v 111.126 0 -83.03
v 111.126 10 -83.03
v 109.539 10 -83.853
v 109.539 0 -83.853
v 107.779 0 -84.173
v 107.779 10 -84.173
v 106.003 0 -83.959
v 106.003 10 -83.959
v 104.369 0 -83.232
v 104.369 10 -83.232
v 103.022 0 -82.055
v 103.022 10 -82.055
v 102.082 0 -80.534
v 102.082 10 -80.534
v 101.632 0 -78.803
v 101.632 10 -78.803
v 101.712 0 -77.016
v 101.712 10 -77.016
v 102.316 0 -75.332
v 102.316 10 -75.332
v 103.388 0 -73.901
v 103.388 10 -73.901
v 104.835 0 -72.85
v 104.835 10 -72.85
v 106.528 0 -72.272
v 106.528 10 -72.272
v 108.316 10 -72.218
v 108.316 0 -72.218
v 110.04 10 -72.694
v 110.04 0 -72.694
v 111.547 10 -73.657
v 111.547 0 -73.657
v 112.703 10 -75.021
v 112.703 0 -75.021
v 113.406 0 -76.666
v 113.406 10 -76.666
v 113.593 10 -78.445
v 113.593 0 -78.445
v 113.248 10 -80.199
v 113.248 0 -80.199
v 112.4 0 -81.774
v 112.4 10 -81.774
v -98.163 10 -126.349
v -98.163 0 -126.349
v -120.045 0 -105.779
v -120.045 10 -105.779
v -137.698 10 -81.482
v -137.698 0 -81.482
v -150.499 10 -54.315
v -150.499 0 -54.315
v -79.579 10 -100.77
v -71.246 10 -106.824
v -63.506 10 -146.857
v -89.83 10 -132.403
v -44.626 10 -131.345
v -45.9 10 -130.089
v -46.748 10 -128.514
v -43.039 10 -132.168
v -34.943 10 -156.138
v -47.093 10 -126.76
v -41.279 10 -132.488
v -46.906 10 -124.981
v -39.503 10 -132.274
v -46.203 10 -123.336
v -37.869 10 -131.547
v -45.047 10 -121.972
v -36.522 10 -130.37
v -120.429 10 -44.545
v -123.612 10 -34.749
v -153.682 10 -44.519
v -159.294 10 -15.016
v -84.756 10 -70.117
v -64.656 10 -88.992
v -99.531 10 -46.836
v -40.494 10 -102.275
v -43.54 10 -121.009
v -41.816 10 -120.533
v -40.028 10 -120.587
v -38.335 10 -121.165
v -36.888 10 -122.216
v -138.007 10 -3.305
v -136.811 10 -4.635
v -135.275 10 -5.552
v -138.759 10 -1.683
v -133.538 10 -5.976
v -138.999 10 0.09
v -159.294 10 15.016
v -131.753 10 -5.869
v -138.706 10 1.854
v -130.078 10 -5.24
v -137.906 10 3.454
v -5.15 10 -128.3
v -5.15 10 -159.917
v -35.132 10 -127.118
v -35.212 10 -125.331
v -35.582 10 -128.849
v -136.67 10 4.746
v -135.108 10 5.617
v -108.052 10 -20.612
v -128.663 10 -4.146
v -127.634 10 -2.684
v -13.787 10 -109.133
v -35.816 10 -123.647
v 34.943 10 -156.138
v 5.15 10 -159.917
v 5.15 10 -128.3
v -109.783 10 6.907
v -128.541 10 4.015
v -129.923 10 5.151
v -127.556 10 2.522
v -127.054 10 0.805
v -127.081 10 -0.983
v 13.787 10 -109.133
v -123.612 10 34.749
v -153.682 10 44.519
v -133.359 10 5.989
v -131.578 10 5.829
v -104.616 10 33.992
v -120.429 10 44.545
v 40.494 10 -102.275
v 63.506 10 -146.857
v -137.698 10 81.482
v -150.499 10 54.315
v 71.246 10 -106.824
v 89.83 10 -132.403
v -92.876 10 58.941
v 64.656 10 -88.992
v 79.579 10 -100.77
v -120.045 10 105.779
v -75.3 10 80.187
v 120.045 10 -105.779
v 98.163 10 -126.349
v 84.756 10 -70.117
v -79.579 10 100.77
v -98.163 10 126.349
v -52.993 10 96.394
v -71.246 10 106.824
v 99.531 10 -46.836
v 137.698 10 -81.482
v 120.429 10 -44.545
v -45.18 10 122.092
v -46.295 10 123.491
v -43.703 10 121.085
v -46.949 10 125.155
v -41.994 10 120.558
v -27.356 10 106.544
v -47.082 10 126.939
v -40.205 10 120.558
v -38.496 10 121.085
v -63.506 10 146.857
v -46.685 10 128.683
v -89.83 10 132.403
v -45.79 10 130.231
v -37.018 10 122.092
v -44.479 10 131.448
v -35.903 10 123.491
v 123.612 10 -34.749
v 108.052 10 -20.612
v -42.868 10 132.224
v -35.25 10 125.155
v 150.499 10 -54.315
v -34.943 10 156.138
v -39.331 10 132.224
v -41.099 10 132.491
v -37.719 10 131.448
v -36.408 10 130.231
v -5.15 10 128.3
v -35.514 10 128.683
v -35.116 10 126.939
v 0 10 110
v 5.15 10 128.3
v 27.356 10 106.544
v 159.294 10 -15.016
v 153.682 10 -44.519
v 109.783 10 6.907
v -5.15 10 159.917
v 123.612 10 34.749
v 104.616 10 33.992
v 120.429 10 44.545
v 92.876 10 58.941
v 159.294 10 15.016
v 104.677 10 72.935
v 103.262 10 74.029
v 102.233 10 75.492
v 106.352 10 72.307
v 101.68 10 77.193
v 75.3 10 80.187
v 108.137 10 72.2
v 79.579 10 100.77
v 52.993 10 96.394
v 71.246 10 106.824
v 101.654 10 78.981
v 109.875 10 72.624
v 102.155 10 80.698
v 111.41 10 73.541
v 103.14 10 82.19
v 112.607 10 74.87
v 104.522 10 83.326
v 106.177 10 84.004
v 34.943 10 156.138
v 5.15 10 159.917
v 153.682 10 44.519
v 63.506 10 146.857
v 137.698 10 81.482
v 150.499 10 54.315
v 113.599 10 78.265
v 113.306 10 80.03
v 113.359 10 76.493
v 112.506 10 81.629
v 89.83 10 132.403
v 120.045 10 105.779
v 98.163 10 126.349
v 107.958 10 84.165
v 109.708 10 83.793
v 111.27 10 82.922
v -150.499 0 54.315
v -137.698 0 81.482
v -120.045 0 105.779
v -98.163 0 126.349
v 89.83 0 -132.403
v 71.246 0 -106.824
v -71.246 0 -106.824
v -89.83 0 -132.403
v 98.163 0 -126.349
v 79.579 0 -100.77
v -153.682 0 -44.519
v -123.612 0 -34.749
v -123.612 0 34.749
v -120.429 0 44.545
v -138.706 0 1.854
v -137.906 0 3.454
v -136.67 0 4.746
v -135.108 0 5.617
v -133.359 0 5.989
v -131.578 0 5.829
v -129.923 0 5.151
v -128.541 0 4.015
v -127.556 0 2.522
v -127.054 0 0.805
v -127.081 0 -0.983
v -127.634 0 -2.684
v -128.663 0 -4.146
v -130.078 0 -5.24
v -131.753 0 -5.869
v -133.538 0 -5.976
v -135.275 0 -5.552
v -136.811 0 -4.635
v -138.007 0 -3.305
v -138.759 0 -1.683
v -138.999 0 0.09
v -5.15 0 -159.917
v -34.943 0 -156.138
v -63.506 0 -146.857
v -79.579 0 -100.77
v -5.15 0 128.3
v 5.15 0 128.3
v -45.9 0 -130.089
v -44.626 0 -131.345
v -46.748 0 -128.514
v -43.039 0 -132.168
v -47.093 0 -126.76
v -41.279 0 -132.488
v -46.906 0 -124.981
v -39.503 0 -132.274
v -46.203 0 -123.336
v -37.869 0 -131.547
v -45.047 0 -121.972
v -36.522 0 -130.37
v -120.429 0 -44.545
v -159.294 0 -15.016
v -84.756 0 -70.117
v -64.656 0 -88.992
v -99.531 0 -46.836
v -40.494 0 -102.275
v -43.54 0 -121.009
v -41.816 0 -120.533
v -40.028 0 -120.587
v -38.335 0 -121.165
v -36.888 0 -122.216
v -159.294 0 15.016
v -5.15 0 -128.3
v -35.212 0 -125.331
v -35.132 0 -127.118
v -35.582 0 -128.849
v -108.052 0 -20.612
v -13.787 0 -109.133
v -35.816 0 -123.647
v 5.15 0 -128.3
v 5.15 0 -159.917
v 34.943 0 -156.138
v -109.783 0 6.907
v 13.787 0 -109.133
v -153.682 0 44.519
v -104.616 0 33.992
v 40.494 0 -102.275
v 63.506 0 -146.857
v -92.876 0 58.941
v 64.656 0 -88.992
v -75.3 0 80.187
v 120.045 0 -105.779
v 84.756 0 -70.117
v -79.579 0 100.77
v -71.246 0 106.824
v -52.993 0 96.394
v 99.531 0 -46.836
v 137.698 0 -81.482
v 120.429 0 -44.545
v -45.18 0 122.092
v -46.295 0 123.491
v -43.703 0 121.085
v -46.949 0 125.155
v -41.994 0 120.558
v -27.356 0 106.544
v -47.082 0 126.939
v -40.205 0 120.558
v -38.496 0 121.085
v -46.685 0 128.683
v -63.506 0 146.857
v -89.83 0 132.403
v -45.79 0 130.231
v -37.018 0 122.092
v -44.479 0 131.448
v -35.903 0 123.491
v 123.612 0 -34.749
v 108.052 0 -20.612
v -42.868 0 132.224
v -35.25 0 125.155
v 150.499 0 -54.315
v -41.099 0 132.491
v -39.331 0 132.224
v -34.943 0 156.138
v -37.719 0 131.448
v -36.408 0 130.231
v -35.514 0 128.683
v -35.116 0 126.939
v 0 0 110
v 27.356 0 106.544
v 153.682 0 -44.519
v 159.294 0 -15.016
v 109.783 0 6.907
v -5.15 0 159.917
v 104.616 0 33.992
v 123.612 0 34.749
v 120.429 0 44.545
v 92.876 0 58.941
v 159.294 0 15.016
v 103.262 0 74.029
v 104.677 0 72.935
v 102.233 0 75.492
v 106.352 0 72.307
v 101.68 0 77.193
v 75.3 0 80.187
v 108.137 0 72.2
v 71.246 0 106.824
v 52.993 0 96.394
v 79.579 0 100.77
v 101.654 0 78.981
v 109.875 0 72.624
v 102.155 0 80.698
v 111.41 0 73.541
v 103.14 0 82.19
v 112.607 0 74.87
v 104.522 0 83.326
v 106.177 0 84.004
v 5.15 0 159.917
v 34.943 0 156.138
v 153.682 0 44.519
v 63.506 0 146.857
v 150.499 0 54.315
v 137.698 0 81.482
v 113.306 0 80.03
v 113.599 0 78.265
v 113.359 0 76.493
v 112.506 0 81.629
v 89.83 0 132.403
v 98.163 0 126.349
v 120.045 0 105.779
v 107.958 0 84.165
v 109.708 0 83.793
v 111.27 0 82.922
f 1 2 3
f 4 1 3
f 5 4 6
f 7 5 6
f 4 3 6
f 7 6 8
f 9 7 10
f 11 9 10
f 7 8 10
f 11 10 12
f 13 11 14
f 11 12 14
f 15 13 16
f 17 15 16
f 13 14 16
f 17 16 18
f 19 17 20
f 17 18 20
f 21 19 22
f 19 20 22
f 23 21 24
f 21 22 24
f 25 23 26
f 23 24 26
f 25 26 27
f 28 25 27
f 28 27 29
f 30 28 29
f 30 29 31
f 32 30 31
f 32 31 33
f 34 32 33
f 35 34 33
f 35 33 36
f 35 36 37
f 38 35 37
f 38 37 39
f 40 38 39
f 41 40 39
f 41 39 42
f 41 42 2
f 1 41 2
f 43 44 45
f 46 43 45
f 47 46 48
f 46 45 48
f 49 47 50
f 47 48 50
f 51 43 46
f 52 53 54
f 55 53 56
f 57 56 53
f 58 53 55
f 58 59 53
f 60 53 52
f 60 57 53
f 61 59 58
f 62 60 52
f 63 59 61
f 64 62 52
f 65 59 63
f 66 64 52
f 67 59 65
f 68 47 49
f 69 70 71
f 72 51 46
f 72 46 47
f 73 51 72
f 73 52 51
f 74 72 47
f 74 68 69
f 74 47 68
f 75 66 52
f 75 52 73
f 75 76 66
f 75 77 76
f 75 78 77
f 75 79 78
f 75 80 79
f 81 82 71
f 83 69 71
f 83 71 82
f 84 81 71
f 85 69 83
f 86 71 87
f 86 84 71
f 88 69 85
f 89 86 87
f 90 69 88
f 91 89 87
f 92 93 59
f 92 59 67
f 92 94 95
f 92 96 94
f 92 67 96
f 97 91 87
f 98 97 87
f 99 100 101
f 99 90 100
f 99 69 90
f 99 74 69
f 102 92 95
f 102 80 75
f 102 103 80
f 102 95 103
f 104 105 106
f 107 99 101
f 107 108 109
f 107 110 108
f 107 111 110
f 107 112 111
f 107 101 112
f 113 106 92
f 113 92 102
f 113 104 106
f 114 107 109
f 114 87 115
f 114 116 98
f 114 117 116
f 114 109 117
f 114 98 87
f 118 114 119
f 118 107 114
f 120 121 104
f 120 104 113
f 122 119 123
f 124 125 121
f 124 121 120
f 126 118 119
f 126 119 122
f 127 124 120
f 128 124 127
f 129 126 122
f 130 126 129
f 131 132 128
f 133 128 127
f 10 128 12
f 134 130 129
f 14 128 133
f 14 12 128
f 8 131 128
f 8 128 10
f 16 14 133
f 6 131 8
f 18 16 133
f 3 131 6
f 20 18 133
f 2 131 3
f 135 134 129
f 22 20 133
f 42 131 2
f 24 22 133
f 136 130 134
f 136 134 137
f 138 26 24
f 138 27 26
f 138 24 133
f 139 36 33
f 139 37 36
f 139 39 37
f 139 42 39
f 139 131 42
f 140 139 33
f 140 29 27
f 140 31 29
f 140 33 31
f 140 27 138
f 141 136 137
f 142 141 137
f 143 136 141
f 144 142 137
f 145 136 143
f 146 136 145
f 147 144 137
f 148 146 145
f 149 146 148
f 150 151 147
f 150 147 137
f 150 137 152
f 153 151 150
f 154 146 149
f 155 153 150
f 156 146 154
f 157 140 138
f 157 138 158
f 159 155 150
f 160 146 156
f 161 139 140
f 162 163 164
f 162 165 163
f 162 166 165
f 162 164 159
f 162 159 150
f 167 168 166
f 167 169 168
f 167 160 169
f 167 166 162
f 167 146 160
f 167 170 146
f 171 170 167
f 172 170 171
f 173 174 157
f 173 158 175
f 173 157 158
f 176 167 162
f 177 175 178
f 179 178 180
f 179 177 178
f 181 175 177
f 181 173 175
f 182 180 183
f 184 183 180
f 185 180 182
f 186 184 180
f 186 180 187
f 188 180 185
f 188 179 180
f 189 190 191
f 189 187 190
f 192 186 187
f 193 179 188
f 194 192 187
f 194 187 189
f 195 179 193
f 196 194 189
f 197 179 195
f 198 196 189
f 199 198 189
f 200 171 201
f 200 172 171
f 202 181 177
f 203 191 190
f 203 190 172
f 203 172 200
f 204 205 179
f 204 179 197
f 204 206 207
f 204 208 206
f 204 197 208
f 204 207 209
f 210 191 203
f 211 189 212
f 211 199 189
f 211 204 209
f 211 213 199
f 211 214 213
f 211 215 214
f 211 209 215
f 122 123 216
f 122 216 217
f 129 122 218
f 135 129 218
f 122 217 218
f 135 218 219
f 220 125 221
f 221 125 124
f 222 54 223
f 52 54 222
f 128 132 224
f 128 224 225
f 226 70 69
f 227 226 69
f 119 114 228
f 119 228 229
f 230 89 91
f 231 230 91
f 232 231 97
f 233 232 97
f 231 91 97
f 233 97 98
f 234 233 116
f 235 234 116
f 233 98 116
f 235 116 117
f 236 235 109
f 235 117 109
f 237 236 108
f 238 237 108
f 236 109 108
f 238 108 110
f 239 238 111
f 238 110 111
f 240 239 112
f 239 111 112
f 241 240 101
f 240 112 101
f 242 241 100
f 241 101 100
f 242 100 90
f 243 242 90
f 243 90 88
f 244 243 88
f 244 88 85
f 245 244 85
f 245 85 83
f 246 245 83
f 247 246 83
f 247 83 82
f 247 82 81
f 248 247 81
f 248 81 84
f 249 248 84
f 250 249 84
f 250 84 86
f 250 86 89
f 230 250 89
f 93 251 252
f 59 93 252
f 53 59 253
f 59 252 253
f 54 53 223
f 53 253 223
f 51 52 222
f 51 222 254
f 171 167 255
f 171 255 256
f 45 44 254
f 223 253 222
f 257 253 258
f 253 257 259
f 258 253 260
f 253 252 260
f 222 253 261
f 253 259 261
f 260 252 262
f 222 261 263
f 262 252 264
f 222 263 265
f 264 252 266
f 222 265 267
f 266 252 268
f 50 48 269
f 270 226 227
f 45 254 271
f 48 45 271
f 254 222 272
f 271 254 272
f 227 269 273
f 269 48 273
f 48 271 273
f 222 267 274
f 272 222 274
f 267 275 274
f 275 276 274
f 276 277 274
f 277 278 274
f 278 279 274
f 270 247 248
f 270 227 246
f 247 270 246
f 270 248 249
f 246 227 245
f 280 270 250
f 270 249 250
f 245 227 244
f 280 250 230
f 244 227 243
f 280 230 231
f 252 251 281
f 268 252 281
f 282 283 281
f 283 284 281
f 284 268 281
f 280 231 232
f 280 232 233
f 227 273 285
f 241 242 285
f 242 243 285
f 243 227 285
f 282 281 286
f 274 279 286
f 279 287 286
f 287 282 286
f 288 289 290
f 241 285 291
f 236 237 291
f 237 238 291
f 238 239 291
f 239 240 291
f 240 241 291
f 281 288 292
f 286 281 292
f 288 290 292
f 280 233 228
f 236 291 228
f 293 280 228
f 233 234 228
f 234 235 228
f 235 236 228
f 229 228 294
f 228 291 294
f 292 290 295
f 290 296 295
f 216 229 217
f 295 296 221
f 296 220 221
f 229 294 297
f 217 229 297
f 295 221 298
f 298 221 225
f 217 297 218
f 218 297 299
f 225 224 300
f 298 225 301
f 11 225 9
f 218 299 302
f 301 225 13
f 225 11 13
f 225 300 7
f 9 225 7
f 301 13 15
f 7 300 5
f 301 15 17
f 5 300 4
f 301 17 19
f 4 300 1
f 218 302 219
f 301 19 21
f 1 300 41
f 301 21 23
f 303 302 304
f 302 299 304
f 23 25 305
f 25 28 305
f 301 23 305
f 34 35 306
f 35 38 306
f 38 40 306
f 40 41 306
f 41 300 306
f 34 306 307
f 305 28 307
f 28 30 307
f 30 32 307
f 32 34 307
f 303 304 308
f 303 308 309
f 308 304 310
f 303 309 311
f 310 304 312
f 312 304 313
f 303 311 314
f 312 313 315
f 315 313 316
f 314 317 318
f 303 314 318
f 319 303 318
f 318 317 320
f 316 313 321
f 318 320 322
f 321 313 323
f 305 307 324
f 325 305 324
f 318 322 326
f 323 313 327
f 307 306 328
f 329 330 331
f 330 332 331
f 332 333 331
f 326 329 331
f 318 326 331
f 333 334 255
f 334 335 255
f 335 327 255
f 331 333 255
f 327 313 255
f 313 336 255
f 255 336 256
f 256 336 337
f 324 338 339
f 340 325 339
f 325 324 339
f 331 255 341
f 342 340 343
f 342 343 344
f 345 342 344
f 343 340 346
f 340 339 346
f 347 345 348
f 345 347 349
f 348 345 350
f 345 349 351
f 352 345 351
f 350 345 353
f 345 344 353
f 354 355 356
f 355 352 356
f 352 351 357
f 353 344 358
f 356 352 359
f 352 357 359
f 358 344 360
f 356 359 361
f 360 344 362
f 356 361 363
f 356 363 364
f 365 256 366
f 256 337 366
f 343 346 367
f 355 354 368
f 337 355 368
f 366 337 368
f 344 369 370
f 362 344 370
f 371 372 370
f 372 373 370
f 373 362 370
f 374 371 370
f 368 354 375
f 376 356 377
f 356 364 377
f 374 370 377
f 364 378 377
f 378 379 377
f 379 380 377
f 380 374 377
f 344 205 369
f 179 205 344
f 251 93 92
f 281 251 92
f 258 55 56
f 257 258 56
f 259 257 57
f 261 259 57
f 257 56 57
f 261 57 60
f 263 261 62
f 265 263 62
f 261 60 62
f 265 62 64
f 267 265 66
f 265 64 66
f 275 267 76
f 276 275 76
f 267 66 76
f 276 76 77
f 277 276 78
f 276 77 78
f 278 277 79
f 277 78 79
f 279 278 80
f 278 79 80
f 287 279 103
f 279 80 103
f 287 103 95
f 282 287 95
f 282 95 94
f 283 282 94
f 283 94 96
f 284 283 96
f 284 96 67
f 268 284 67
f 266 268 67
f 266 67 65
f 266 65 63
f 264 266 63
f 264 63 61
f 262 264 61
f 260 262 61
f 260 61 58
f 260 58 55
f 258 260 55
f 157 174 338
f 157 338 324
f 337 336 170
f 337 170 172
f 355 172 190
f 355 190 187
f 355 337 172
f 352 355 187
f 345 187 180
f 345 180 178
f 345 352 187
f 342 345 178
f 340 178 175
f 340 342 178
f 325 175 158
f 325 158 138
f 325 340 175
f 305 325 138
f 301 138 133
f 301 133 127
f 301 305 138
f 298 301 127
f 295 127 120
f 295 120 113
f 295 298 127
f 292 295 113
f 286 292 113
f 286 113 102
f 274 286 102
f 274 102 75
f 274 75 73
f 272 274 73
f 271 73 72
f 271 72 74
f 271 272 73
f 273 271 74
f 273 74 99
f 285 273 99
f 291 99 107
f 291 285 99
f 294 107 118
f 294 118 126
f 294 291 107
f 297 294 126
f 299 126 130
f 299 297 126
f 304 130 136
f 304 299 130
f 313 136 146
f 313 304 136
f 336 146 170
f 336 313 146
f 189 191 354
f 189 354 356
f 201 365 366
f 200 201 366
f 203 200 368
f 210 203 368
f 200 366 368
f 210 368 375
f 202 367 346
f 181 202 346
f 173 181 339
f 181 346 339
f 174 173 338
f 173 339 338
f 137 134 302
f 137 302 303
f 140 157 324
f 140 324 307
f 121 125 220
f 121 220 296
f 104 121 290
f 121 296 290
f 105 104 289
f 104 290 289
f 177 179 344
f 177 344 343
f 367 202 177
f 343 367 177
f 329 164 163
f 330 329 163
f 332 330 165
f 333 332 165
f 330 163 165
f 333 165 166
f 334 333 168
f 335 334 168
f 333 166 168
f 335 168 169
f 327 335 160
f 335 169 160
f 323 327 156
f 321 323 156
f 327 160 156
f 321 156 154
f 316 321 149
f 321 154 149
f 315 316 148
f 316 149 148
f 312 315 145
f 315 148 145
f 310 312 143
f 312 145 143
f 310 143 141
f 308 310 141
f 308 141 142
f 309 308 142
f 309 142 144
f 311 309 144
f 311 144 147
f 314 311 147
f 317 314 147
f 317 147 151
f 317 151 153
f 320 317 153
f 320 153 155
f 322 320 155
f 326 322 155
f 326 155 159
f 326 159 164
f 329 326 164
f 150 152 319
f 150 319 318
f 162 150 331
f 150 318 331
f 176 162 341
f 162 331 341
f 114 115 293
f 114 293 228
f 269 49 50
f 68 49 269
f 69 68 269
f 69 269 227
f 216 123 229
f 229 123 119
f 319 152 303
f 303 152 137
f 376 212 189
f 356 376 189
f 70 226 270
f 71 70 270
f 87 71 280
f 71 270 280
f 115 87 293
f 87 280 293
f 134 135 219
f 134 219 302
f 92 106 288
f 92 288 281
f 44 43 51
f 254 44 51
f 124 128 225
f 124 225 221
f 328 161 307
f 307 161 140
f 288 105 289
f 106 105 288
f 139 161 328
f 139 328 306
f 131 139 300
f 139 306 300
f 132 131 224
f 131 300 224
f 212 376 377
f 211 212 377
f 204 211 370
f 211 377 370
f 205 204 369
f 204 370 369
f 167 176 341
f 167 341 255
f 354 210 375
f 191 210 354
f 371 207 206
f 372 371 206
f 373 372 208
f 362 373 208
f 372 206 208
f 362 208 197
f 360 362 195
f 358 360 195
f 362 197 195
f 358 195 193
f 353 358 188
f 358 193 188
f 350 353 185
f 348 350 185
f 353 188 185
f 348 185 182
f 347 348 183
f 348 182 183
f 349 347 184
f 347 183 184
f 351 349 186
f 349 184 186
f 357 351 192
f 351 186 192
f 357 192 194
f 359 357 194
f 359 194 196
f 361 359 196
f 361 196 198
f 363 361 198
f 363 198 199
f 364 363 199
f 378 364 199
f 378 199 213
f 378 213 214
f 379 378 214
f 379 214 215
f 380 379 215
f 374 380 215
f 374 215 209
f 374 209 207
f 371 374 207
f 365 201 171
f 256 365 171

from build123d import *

# Parameters (mm, degrees)
ESQUISSE1_R                  = 160
ESQUISSE1_R_2                = 110
BOSS_EXTRU_1_DEPTH           = 10
ESQUISSE2_W                  = 10.3
ESQUISSE2_H                  = 31.7
ENL_V_MAT_EXTRU_2_DEPTH      = 10
ESQUISSE3_R                  = 6
ENL_V_MAT_EXTRU_3_DEPTH      = 11
R_P_TITION_CIRCULAIRE1_COUNT = 10
R_P_TITION_CIRCULAIRE2_COUNT = 5


with BuildPart() as part:
    # Esquisse1 → Boss.-Extru.1 (new body)
    with BuildSketch(Plane(origin=(0, 0, 0), x_dir=(1, 0, 0), z_dir=(0, 1, 0))):
        with Locations(Location((0, 0, 0), (0, 0, 270))):  # turned: the seam where the file's is
            Circle(ESQUISSE1_R)
        with Locations(Location((0, 0, 0), (0, 0, 270))):  # turned: the seam where the file's is
            Circle(ESQUISSE1_R_2, mode=Mode.SUBTRACT)
    extrude(amount=BOSS_EXTRU_1_DEPTH)

    # Esquisse2 → Enl_v. mat.-Extru.2 (cut)
    with BuildSketch(Plane(origin=(0, 10, 0), x_dir=(1, 0, 0), z_dir=(0, 1, 0))):
        with Locations((0, -144.15)):
            Rectangle(ESQUISSE2_W, ESQUISSE2_H)
    enl_v_mat_extru_2 = extrude(amount=-ENL_V_MAT_EXTRU_2_DEPTH, mode=Mode.SUBTRACT)

    # Esquisse3 → Enl_v. mat.-Extru.3 (cut, through all)
    with BuildSketch(Plane(origin=(0, 10, 0), x_dir=(1, 0, 0), z_dir=(0, 1, 0))):
        with Locations(Location((-41.099260252, -126.490516667, 0), (0, 0, 270))):  # turned: the seam where the file's is
            Circle(ESQUISSE3_R)
    enl_v_mat_extru_3 = extrude(amount=-ENL_V_MAT_EXTRU_3_DEPTH, mode=Mode.SUBTRACT)

    # R_p_tition circulaire1: Enl_v. mat.-Extru.2 ×10 about axis
    r_p_tition_circulaire1_axis = Axis((0, 0, 0), (0, 1, 0))
    for i in range(1, R_P_TITION_CIRCULAIRE1_COUNT):
        add(enl_v_mat_extru_2.rotate(r_p_tition_circulaire1_axis, i * 360 / R_P_TITION_CIRCULAIRE1_COUNT), mode=Mode.SUBTRACT)

    # R_p_tition circulaire2: Enl_v. mat.-Extru.3 ×5 about axis
    r_p_tition_circulaire2_axis = Axis((0, 0, 0), (0, 1, 0))
    for i in range(1, R_P_TITION_CIRCULAIRE2_COUNT):
        add(enl_v_mat_extru_3.rotate(r_p_tition_circulaire2_axis, i * 360 / R_P_TITION_CIRCULAIRE2_COUNT), mode=Mode.SUBTRACT)


solid = part.part
